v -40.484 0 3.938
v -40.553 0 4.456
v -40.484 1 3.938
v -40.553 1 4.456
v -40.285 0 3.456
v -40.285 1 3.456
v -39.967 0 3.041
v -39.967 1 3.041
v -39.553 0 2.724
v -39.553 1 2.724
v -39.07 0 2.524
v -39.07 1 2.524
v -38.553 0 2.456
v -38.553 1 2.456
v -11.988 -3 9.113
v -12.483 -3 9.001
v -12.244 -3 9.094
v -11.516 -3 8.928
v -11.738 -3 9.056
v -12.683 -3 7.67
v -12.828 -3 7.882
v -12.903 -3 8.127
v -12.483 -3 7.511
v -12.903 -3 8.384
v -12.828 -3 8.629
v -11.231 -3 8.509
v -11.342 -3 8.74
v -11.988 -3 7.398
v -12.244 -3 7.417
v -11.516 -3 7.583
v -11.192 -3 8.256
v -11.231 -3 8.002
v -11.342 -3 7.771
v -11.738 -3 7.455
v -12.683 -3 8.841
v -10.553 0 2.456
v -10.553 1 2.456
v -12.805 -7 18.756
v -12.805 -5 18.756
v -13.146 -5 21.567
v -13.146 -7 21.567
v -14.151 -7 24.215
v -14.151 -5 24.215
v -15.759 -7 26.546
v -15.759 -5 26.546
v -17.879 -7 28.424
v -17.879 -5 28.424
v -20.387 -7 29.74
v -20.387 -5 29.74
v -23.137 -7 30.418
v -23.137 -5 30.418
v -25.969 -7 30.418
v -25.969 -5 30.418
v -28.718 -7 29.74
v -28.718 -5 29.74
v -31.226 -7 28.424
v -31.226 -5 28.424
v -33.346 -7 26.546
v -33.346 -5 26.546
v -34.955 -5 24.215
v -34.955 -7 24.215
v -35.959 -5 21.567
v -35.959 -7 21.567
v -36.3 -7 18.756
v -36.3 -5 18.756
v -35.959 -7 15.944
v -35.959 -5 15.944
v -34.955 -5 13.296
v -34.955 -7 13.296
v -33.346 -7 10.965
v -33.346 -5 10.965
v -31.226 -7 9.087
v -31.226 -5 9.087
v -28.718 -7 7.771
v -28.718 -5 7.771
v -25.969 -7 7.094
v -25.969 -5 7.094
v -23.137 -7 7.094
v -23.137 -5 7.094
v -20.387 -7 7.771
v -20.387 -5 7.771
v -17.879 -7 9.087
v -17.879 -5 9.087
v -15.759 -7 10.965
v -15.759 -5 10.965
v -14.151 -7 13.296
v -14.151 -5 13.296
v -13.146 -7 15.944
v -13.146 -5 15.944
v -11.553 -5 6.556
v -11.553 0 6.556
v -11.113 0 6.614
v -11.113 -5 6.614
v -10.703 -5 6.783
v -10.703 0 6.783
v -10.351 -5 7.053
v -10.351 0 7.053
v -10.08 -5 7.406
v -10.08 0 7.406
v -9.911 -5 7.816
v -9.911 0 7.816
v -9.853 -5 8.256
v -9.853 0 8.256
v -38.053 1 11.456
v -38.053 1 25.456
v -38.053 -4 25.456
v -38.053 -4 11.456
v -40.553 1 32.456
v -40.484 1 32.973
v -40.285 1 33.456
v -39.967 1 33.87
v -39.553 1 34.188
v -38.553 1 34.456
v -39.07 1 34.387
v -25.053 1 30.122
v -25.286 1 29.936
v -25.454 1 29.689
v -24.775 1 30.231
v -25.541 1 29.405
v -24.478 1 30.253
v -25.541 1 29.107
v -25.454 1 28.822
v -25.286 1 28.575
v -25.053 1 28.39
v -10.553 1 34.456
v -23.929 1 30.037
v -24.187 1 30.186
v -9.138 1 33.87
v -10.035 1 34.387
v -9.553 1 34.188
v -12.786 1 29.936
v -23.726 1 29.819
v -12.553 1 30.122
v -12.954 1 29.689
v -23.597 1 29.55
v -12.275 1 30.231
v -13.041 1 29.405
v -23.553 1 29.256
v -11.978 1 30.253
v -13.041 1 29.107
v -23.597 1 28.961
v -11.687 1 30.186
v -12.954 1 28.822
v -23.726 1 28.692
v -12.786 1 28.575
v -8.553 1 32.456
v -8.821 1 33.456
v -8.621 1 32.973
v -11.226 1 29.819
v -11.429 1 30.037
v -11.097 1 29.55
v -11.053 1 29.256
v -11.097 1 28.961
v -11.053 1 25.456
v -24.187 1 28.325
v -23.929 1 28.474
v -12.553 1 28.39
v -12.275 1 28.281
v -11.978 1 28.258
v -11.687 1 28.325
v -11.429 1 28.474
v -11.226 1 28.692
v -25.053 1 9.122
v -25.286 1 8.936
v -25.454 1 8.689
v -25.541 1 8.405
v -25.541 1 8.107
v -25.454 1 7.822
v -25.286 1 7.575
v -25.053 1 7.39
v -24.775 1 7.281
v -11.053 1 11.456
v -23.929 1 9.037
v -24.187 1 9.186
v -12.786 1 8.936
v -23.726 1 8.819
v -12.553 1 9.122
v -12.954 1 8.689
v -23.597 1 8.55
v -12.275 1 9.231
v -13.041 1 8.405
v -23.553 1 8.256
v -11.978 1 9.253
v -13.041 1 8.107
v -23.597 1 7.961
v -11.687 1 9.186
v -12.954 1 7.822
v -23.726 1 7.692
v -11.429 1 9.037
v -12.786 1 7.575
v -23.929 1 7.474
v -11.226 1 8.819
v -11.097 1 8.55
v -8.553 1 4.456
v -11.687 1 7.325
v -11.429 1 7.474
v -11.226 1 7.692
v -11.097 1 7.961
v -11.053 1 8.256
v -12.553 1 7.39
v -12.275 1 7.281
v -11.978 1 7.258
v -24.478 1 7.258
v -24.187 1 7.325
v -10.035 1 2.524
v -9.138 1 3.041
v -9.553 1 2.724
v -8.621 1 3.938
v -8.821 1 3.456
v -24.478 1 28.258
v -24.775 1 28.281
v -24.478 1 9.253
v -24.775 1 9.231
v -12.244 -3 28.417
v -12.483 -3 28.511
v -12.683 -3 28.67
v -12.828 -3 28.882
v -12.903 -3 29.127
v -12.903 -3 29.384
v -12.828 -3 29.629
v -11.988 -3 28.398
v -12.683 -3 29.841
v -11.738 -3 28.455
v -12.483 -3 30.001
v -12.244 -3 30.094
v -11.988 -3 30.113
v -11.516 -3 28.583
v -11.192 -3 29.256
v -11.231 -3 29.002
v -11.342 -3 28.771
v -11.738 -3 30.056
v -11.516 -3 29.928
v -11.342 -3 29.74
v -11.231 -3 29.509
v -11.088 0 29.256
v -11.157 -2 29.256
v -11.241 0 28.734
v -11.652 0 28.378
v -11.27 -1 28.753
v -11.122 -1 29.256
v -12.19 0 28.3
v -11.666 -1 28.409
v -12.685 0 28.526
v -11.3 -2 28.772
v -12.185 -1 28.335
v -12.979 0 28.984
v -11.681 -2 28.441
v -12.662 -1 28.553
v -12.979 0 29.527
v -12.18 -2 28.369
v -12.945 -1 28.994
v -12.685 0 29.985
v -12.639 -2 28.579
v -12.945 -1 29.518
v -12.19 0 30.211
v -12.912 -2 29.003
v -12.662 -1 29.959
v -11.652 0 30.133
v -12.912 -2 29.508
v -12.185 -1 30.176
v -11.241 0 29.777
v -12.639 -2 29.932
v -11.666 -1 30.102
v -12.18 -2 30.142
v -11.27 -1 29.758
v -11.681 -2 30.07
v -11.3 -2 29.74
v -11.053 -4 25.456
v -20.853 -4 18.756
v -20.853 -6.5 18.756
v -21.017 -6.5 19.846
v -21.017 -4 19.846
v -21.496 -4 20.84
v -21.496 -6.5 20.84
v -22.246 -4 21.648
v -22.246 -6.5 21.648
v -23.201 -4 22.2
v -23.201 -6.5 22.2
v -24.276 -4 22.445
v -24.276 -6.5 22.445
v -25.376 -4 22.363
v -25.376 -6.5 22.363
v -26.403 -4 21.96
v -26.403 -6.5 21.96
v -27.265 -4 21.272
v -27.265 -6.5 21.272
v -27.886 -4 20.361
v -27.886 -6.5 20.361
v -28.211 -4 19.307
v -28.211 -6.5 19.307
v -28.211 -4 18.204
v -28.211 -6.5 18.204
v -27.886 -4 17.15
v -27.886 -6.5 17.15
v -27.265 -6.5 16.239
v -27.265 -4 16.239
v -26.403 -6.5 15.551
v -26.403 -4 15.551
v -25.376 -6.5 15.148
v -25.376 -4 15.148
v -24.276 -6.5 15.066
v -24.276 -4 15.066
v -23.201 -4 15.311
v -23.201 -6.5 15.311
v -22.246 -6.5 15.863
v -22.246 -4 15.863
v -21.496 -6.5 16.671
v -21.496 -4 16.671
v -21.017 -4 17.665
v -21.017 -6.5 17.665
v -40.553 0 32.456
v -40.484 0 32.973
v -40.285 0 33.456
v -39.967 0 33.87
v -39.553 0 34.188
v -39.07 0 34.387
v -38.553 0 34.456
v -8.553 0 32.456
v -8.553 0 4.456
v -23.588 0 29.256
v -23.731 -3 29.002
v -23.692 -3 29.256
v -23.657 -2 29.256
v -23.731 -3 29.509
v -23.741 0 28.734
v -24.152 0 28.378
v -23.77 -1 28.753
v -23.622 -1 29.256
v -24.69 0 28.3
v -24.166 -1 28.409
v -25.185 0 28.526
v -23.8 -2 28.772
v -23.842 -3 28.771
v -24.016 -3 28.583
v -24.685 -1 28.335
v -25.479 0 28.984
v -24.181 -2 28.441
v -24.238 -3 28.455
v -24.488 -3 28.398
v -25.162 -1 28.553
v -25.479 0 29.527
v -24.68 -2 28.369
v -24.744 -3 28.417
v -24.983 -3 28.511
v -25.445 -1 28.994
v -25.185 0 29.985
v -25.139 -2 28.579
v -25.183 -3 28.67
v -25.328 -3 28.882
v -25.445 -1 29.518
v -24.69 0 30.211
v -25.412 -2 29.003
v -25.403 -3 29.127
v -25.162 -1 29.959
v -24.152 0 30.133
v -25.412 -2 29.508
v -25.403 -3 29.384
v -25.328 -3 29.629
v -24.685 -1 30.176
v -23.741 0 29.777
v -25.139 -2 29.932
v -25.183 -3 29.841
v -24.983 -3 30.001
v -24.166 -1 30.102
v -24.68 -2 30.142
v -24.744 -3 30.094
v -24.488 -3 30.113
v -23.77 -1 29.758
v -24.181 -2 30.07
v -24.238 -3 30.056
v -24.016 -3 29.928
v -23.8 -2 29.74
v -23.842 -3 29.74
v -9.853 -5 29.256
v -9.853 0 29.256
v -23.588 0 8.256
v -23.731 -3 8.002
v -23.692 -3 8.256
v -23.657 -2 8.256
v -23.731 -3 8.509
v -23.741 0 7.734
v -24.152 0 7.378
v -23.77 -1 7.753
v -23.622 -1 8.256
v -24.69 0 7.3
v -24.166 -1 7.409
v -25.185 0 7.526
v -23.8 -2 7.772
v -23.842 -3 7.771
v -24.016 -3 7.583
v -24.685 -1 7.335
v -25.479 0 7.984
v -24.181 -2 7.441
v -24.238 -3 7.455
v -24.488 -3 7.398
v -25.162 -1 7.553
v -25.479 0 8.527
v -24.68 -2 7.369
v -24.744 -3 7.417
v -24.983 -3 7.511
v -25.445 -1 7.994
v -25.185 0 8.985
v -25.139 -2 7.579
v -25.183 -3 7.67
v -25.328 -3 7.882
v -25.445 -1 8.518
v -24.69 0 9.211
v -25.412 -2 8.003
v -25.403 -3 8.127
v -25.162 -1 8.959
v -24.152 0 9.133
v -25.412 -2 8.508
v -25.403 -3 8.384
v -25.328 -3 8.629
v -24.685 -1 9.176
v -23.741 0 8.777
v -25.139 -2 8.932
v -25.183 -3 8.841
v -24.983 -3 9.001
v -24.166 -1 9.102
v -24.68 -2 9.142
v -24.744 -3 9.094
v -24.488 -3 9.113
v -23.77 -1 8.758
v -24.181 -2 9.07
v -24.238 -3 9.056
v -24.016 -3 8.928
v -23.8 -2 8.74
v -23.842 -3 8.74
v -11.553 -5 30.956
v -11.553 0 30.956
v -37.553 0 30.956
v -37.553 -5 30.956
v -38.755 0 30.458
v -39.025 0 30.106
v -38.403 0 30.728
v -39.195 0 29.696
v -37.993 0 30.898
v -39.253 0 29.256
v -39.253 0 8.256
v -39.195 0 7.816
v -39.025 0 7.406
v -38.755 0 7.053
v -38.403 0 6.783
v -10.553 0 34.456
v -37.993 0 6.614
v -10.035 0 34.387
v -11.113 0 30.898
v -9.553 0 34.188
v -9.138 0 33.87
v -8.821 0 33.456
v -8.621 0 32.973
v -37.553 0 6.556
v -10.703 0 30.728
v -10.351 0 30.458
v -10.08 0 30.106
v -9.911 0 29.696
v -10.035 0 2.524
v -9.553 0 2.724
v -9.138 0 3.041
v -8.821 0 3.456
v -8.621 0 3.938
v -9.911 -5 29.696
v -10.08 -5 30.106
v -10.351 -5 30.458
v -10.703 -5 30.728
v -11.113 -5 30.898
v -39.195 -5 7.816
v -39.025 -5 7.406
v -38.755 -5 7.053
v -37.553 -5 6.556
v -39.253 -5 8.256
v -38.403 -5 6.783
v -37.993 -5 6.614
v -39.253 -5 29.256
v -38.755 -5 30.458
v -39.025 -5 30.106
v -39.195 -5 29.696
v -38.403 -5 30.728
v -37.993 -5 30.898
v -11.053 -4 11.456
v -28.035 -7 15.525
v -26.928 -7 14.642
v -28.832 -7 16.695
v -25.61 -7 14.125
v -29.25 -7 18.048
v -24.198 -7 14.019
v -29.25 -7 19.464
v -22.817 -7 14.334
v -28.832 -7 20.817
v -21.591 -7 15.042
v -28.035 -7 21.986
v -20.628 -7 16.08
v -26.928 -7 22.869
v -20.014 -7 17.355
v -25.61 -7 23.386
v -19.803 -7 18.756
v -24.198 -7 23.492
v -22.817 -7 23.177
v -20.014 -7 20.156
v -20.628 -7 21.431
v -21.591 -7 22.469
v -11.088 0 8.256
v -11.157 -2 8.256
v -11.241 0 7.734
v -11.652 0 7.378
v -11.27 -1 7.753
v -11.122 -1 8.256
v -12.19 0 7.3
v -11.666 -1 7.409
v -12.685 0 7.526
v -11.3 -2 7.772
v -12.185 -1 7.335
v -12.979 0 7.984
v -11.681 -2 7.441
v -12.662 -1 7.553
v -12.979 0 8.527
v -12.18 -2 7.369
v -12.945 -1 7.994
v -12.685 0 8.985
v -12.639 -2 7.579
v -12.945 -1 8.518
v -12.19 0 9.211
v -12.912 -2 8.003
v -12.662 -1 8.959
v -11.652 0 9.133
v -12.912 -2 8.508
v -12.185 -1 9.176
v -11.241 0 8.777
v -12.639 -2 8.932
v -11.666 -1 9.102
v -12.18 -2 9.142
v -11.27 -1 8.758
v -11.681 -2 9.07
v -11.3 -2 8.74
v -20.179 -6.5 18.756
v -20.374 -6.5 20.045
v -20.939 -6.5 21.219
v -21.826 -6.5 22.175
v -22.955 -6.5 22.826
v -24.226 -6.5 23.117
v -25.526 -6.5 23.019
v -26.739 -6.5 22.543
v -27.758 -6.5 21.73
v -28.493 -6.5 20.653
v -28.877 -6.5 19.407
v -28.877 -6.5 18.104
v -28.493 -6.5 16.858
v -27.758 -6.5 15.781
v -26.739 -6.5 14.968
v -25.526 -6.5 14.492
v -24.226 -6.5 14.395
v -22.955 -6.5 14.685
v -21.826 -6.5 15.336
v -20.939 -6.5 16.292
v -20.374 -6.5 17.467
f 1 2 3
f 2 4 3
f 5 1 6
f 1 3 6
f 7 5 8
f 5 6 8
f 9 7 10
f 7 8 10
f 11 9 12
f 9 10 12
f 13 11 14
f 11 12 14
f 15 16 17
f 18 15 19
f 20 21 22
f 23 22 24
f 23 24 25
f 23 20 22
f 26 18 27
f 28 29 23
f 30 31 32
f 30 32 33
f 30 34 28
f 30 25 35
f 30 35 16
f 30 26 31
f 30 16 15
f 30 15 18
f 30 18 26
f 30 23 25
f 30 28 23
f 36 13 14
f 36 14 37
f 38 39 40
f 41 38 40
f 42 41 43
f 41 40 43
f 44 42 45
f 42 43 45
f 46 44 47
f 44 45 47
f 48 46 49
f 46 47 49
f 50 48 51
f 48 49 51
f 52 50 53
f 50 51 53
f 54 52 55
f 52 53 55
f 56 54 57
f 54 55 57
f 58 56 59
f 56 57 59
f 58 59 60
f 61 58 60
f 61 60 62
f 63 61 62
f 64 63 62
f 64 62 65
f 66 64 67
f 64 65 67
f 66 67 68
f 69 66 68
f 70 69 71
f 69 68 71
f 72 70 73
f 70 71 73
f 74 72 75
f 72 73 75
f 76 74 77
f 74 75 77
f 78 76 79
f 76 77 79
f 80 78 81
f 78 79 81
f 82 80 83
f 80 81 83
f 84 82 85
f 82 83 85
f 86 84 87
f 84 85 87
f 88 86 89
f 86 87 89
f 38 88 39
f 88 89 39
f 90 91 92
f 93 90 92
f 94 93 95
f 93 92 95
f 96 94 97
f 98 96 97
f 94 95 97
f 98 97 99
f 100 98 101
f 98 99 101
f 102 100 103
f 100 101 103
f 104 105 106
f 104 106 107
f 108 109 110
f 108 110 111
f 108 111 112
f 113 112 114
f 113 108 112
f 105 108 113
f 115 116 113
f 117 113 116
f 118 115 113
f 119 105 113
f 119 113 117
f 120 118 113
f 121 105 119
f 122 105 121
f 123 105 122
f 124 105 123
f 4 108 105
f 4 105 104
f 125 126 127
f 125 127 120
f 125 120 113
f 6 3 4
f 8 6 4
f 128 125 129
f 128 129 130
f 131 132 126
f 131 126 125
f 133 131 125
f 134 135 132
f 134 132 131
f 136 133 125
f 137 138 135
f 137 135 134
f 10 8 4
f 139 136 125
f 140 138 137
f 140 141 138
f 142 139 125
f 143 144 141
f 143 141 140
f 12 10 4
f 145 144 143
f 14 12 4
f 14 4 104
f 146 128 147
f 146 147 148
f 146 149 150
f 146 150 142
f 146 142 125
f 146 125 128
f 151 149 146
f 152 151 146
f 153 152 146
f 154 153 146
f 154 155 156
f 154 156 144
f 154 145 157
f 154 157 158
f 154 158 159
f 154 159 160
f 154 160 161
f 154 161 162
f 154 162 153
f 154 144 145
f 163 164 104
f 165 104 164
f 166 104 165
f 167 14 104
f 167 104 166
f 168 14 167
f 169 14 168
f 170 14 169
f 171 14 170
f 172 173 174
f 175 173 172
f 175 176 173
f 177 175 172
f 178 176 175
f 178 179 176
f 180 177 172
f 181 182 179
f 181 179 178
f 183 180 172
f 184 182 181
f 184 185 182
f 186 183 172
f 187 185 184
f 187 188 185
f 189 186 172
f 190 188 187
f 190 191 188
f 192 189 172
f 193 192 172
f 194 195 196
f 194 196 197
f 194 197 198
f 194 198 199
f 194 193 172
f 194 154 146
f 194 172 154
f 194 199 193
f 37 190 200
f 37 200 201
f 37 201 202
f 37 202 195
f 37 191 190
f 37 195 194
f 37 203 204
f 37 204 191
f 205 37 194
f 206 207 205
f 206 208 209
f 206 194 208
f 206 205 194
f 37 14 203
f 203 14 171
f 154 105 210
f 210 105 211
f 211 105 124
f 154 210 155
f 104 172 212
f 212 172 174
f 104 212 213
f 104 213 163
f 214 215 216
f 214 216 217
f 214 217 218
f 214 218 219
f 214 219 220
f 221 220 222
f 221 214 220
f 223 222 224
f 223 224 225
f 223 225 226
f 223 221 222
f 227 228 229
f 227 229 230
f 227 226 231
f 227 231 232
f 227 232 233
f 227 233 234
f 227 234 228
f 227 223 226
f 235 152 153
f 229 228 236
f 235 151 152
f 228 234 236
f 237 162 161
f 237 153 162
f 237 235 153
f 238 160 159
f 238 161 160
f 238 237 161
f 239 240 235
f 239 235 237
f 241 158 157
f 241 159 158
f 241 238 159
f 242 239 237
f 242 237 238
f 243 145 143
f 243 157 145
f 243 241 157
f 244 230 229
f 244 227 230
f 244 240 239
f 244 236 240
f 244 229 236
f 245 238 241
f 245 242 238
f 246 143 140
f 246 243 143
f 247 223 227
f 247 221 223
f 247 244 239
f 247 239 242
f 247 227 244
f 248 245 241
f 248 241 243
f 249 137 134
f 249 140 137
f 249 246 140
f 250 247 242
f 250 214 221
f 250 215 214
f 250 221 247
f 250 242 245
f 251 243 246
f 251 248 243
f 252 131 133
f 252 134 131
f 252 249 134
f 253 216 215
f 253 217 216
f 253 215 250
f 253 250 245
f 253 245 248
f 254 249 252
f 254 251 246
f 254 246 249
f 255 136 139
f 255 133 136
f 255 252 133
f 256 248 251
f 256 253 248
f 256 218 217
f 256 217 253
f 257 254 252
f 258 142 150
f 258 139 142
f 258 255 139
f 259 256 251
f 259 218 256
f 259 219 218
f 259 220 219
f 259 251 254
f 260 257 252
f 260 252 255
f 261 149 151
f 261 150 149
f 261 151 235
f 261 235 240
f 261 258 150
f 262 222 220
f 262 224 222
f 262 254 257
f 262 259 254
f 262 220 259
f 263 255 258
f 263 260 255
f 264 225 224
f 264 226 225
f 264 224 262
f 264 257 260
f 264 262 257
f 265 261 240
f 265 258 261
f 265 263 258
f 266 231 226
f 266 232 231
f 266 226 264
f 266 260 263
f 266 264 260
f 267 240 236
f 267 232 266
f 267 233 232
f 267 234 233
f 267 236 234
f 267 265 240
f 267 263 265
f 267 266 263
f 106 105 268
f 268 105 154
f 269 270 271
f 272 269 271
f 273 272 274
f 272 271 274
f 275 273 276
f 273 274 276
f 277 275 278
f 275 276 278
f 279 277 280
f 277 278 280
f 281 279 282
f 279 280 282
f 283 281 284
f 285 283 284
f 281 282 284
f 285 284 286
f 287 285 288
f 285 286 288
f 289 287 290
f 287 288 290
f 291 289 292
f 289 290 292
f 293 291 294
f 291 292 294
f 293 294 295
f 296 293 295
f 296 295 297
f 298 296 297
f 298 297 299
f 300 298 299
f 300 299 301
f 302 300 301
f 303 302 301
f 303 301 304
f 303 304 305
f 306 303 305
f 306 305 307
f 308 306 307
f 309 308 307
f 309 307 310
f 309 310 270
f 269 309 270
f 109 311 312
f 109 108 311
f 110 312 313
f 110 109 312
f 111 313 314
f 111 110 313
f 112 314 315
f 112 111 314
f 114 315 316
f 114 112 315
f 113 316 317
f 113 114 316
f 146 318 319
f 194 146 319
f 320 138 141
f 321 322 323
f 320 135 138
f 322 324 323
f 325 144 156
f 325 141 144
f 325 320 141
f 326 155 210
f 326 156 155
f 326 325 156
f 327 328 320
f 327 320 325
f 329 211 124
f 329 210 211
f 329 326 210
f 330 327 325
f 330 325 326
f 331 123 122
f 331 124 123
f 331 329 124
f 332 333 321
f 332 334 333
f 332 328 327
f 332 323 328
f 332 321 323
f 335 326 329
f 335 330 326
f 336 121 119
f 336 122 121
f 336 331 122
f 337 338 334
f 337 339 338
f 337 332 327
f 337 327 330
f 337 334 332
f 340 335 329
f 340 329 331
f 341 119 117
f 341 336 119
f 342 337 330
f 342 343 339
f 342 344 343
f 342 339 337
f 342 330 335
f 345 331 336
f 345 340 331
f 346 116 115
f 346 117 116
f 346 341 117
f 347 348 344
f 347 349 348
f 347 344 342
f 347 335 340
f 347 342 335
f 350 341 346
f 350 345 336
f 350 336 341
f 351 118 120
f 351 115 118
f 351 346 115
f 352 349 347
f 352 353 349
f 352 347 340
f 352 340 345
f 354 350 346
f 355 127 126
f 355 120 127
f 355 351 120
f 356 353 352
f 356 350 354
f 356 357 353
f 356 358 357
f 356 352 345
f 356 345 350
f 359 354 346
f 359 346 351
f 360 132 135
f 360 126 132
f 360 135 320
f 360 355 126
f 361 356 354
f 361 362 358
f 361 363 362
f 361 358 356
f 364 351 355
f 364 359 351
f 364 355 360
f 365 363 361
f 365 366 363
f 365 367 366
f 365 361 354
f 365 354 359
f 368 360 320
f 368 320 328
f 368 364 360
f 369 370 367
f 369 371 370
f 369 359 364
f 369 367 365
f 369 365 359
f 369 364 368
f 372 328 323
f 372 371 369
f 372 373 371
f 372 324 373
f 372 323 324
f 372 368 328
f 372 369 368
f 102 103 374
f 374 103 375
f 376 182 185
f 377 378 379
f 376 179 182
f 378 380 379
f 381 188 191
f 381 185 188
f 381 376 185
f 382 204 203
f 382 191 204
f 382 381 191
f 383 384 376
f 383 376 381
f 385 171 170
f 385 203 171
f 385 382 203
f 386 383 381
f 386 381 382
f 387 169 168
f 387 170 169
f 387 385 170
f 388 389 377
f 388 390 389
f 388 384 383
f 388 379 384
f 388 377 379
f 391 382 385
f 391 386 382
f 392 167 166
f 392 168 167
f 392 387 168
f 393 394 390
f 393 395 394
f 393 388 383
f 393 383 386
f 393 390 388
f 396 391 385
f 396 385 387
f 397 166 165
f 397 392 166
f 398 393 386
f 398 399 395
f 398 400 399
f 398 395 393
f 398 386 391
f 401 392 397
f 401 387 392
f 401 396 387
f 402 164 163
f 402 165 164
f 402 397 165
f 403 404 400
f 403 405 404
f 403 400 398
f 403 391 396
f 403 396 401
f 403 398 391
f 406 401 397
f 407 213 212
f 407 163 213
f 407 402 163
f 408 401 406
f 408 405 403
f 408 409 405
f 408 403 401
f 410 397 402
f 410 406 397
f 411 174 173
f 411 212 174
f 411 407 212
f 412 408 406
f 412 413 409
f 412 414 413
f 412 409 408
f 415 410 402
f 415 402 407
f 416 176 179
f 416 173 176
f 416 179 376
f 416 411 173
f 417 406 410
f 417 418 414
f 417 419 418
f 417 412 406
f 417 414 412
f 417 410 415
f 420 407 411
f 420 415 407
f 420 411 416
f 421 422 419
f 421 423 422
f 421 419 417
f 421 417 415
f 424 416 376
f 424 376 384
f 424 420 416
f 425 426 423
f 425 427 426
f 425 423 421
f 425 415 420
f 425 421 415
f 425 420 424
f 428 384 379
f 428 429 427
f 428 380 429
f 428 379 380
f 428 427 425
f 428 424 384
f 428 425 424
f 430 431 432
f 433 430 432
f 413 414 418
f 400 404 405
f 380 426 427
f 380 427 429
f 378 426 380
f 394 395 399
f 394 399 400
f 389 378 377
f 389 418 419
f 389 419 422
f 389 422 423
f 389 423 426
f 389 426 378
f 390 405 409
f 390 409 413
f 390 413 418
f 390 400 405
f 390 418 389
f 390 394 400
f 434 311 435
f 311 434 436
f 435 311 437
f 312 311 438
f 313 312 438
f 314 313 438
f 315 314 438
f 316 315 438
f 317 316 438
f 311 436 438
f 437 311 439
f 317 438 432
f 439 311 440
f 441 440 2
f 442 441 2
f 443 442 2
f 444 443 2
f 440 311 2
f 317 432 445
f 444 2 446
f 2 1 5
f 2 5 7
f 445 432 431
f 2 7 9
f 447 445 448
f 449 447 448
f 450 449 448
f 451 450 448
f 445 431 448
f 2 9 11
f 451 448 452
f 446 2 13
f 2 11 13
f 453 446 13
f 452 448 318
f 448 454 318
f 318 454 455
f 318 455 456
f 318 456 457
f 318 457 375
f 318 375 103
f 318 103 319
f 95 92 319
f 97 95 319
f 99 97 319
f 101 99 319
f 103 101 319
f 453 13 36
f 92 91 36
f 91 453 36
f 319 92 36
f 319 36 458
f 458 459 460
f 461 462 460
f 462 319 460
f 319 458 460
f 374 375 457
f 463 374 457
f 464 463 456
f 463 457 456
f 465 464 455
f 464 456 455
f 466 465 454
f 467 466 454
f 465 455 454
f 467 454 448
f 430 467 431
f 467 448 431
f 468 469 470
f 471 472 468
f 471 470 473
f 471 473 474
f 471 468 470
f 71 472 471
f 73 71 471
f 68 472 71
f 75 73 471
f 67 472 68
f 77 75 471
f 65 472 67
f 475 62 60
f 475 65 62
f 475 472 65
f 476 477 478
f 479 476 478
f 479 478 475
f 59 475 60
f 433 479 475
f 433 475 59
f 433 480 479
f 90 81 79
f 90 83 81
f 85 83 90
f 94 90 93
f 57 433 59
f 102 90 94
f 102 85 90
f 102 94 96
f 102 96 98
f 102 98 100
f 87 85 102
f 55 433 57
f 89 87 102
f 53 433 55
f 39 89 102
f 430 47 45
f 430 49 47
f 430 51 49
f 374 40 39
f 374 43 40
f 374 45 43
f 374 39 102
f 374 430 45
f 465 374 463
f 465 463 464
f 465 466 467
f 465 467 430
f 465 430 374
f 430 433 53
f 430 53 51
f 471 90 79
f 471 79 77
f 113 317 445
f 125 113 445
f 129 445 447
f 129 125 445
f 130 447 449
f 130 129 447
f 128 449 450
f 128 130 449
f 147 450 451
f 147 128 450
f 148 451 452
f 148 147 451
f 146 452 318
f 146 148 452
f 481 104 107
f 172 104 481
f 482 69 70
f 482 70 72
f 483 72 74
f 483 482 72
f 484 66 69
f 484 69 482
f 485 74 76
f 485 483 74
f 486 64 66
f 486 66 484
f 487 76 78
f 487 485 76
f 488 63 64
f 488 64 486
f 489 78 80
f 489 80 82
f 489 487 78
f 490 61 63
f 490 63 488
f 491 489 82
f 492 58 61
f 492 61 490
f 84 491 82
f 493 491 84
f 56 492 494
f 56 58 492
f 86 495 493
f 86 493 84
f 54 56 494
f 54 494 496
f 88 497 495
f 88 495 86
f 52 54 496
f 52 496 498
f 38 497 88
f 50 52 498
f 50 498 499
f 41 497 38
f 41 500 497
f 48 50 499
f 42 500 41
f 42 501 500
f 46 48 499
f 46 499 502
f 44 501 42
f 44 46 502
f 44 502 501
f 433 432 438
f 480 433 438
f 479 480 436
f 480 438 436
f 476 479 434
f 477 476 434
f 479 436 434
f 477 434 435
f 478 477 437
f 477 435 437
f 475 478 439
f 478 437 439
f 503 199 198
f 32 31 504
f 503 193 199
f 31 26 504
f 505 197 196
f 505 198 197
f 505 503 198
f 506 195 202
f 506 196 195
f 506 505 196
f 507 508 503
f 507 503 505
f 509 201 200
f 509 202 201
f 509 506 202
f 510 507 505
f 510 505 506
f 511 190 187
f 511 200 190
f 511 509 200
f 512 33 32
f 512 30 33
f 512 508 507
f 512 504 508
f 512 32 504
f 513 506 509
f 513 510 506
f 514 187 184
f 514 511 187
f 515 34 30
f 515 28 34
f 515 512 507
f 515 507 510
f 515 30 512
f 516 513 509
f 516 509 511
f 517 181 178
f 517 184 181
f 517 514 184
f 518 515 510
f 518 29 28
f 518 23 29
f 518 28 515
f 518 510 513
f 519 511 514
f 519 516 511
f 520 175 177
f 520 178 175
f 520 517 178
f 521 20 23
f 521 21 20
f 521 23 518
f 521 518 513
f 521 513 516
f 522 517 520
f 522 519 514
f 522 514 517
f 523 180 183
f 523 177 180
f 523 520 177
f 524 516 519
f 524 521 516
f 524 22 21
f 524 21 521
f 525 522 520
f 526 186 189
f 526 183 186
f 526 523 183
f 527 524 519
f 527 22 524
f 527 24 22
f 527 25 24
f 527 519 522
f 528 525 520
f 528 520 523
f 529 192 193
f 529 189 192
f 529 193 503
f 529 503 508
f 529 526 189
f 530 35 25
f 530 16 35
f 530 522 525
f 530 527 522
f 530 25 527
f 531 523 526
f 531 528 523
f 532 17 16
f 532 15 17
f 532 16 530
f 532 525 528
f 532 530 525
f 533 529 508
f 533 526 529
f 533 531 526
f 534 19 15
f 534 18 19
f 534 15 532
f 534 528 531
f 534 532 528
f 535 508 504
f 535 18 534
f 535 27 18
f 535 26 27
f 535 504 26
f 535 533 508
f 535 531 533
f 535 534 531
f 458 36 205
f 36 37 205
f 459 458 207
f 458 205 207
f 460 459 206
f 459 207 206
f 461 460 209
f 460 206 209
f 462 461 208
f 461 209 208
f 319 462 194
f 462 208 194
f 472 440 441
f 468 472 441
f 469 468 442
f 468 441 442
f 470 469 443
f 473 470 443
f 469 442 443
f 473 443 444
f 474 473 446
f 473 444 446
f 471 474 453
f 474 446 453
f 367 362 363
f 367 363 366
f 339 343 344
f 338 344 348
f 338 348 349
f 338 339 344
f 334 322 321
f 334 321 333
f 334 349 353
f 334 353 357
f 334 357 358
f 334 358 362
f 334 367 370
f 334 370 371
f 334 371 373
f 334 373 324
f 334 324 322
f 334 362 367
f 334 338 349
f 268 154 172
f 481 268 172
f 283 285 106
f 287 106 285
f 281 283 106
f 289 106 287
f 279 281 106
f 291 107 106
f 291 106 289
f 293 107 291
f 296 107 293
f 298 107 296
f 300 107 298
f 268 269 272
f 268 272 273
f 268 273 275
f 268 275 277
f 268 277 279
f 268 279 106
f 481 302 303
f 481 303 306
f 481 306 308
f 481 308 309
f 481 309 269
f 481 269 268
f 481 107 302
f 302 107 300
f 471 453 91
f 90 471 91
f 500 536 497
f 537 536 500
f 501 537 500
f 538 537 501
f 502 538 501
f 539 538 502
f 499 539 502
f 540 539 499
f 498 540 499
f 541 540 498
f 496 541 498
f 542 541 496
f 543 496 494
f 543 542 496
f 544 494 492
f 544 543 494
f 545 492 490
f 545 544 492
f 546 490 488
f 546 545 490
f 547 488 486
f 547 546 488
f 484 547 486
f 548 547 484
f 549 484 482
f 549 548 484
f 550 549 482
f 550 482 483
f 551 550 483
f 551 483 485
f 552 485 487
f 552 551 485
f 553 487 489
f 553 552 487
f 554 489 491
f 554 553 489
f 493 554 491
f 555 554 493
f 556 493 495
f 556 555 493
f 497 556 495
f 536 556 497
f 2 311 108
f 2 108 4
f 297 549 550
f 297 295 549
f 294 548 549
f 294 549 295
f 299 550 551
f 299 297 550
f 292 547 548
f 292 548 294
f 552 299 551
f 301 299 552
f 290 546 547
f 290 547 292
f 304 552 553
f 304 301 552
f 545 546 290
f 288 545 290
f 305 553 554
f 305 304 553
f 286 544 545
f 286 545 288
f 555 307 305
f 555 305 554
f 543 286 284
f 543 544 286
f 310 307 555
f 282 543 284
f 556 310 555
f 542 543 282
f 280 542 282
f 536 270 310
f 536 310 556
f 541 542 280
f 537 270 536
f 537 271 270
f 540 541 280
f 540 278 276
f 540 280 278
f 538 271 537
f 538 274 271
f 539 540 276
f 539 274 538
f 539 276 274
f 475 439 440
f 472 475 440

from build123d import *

# Parameters (mm, degrees)
SKETCH_1_W          = 32
SKETCH_1_H          = 32
EXTRUDE_1_DEPTH     = 1
EXTRUDE_2_DEPTH     = 5
SKETCH_2_W          = 27
SKETCH_2_H          = 14
CUT_EXTRUDE_1_DEPTH = 5
SKETCH_4_R          = 11.747624997
EXTRUDE_3_DEPTH     = 2
SKETCH_5_R          = 4.75
CUT_EXTRUDE_2_DEPTH = 0.5
CUT_EXTRUDE_2_TAPER = 37
SKETCH_6_R          = 3.7
CUT_EXTRUDE_3_DEPTH = 8.5
FILLET_1_R          = 2
SKETCH_7_R          = 1
CUT_EXTRUDE_4_DEPTH = 4
CUT_EXTRUDE_4_TAPER = 2


with BuildPart() as part:
    # 草图1 → 凸台-拉伸1 (new body)
    with BuildSketch(Plane(origin=(0, 0, 0), x_dir=(1, 0, 0), z_dir=(0, 1, 0))):
        with Locations((-24.552631543, -18.455578089)):
            Rectangle(SKETCH_1_W, SKETCH_1_H)
    extrude(amount=EXTRUDE_1_DEPTH)

    # 草图3 → 凸台-拉伸2 (add)
    with BuildSketch(Plane.XZ):
        with BuildLine():
            Line((-9.852631543, 8.255578089), (-9.852631543, 29.255578089))
            ThreePointArc((-9.852631543, 29.255578089), (-10.350550015, 30.457659617), (-11.552631543, 30.955578089))
            Line((-11.552631543, 30.955578089), (-37.552631543, 30.955578089))
            ThreePointArc((-37.552631543, 30.955578089), (-38.754713071, 30.457659617), (-39.252631543, 29.255578089))
            Line((-39.252631543, 29.255578089), (-39.252631543, 8.255578089))
            ThreePointArc((-39.252631543, 8.255578089), (-38.754713071, 7.053496561), (-37.552631543, 6.555578089))
            Line((-37.552631543, 6.555578089), (-11.552631543, 6.555578089))
            ThreePointArc((-11.552631543, 6.555578089), (-10.350550015, 7.053496561), (-9.852631543, 8.255578089))
        make_face()
    extrude(amount=EXTRUDE_2_DEPTH)

    # 草图2 → 切除-拉伸1 (cut)
    with BuildSketch(Plane(origin=(0, 1, 0), x_dir=(1, 0, 0), z_dir=(0, 1, 0))):
        with Locations((-24.552631543, -18.455578089)):
            Rectangle(SKETCH_2_W, SKETCH_2_H)
    extrude(amount=-CUT_EXTRUDE_1_DEPTH, mode=Mode.SUBTRACT)

    # 草图4 → 凸台-拉伸3 (add)
    with BuildSketch(Plane.XZ.offset(5)):
        with Locations((-24.552631543, 18.755578089)):
            Circle(SKETCH_4_R)
    extrude(amount=EXTRUDE_3_DEPTH)

    # 草图5 → 切除-拉伸2 (cut)
    with BuildSketch(Plane.XZ.offset(7)):
        with Locations((-24.552631543, 18.755578089)):
            Circle(SKETCH_5_R)
    extrude(amount=-CUT_EXTRUDE_2_DEPTH, taper=CUT_EXTRUDE_2_TAPER, mode=Mode.SUBTRACT)

    # 草图6 → 切除-拉伸3 (cut, through all)
    with BuildSketch(Plane.XZ.offset(6.5)):
        with Locations((-24.552631543, 18.755578089)):
            Circle(SKETCH_6_R)
    extrude(amount=-CUT_EXTRUDE_3_DEPTH, mode=Mode.SUBTRACT)

    # 圆角1
    fillet_1_edges = [part.edges().sort_by_distance(p)[0] for p in [
        (-40.552631543, 0.5, 2.455578089),
        (-8.552631543, 0.5, 2.455578089),
        (-8.552631543, 0.5, 34.455578089),
        (-40.552631543, 0.5, 34.455578089),
    ]]
    fillet(fillet_1_edges, radius=FILLET_1_R)

    # 草图7 → 切除-拉伸4 (cut)
    with BuildSketch(Plane(origin=(0, 1, 0), x_dir=(1, 0, 0), z_dir=(0, 1, 0))):
        with Locations((-24.552631543, -8.255578089)):
            Circle(SKETCH_7_R)
        with Locations((-12.052631543, -8.255578089)):
            Circle(SKETCH_7_R)
        with Locations((-24.552631543, -29.255578089)):
            Circle(SKETCH_7_R)
        with Locations((-12.052631543, -29.255578089)):
            Circle(SKETCH_7_R)
    extrude(amount=-CUT_EXTRUDE_4_DEPTH, taper=CUT_EXTRUDE_4_TAPER, mode=Mode.SUBTRACT)


solid = part.part
